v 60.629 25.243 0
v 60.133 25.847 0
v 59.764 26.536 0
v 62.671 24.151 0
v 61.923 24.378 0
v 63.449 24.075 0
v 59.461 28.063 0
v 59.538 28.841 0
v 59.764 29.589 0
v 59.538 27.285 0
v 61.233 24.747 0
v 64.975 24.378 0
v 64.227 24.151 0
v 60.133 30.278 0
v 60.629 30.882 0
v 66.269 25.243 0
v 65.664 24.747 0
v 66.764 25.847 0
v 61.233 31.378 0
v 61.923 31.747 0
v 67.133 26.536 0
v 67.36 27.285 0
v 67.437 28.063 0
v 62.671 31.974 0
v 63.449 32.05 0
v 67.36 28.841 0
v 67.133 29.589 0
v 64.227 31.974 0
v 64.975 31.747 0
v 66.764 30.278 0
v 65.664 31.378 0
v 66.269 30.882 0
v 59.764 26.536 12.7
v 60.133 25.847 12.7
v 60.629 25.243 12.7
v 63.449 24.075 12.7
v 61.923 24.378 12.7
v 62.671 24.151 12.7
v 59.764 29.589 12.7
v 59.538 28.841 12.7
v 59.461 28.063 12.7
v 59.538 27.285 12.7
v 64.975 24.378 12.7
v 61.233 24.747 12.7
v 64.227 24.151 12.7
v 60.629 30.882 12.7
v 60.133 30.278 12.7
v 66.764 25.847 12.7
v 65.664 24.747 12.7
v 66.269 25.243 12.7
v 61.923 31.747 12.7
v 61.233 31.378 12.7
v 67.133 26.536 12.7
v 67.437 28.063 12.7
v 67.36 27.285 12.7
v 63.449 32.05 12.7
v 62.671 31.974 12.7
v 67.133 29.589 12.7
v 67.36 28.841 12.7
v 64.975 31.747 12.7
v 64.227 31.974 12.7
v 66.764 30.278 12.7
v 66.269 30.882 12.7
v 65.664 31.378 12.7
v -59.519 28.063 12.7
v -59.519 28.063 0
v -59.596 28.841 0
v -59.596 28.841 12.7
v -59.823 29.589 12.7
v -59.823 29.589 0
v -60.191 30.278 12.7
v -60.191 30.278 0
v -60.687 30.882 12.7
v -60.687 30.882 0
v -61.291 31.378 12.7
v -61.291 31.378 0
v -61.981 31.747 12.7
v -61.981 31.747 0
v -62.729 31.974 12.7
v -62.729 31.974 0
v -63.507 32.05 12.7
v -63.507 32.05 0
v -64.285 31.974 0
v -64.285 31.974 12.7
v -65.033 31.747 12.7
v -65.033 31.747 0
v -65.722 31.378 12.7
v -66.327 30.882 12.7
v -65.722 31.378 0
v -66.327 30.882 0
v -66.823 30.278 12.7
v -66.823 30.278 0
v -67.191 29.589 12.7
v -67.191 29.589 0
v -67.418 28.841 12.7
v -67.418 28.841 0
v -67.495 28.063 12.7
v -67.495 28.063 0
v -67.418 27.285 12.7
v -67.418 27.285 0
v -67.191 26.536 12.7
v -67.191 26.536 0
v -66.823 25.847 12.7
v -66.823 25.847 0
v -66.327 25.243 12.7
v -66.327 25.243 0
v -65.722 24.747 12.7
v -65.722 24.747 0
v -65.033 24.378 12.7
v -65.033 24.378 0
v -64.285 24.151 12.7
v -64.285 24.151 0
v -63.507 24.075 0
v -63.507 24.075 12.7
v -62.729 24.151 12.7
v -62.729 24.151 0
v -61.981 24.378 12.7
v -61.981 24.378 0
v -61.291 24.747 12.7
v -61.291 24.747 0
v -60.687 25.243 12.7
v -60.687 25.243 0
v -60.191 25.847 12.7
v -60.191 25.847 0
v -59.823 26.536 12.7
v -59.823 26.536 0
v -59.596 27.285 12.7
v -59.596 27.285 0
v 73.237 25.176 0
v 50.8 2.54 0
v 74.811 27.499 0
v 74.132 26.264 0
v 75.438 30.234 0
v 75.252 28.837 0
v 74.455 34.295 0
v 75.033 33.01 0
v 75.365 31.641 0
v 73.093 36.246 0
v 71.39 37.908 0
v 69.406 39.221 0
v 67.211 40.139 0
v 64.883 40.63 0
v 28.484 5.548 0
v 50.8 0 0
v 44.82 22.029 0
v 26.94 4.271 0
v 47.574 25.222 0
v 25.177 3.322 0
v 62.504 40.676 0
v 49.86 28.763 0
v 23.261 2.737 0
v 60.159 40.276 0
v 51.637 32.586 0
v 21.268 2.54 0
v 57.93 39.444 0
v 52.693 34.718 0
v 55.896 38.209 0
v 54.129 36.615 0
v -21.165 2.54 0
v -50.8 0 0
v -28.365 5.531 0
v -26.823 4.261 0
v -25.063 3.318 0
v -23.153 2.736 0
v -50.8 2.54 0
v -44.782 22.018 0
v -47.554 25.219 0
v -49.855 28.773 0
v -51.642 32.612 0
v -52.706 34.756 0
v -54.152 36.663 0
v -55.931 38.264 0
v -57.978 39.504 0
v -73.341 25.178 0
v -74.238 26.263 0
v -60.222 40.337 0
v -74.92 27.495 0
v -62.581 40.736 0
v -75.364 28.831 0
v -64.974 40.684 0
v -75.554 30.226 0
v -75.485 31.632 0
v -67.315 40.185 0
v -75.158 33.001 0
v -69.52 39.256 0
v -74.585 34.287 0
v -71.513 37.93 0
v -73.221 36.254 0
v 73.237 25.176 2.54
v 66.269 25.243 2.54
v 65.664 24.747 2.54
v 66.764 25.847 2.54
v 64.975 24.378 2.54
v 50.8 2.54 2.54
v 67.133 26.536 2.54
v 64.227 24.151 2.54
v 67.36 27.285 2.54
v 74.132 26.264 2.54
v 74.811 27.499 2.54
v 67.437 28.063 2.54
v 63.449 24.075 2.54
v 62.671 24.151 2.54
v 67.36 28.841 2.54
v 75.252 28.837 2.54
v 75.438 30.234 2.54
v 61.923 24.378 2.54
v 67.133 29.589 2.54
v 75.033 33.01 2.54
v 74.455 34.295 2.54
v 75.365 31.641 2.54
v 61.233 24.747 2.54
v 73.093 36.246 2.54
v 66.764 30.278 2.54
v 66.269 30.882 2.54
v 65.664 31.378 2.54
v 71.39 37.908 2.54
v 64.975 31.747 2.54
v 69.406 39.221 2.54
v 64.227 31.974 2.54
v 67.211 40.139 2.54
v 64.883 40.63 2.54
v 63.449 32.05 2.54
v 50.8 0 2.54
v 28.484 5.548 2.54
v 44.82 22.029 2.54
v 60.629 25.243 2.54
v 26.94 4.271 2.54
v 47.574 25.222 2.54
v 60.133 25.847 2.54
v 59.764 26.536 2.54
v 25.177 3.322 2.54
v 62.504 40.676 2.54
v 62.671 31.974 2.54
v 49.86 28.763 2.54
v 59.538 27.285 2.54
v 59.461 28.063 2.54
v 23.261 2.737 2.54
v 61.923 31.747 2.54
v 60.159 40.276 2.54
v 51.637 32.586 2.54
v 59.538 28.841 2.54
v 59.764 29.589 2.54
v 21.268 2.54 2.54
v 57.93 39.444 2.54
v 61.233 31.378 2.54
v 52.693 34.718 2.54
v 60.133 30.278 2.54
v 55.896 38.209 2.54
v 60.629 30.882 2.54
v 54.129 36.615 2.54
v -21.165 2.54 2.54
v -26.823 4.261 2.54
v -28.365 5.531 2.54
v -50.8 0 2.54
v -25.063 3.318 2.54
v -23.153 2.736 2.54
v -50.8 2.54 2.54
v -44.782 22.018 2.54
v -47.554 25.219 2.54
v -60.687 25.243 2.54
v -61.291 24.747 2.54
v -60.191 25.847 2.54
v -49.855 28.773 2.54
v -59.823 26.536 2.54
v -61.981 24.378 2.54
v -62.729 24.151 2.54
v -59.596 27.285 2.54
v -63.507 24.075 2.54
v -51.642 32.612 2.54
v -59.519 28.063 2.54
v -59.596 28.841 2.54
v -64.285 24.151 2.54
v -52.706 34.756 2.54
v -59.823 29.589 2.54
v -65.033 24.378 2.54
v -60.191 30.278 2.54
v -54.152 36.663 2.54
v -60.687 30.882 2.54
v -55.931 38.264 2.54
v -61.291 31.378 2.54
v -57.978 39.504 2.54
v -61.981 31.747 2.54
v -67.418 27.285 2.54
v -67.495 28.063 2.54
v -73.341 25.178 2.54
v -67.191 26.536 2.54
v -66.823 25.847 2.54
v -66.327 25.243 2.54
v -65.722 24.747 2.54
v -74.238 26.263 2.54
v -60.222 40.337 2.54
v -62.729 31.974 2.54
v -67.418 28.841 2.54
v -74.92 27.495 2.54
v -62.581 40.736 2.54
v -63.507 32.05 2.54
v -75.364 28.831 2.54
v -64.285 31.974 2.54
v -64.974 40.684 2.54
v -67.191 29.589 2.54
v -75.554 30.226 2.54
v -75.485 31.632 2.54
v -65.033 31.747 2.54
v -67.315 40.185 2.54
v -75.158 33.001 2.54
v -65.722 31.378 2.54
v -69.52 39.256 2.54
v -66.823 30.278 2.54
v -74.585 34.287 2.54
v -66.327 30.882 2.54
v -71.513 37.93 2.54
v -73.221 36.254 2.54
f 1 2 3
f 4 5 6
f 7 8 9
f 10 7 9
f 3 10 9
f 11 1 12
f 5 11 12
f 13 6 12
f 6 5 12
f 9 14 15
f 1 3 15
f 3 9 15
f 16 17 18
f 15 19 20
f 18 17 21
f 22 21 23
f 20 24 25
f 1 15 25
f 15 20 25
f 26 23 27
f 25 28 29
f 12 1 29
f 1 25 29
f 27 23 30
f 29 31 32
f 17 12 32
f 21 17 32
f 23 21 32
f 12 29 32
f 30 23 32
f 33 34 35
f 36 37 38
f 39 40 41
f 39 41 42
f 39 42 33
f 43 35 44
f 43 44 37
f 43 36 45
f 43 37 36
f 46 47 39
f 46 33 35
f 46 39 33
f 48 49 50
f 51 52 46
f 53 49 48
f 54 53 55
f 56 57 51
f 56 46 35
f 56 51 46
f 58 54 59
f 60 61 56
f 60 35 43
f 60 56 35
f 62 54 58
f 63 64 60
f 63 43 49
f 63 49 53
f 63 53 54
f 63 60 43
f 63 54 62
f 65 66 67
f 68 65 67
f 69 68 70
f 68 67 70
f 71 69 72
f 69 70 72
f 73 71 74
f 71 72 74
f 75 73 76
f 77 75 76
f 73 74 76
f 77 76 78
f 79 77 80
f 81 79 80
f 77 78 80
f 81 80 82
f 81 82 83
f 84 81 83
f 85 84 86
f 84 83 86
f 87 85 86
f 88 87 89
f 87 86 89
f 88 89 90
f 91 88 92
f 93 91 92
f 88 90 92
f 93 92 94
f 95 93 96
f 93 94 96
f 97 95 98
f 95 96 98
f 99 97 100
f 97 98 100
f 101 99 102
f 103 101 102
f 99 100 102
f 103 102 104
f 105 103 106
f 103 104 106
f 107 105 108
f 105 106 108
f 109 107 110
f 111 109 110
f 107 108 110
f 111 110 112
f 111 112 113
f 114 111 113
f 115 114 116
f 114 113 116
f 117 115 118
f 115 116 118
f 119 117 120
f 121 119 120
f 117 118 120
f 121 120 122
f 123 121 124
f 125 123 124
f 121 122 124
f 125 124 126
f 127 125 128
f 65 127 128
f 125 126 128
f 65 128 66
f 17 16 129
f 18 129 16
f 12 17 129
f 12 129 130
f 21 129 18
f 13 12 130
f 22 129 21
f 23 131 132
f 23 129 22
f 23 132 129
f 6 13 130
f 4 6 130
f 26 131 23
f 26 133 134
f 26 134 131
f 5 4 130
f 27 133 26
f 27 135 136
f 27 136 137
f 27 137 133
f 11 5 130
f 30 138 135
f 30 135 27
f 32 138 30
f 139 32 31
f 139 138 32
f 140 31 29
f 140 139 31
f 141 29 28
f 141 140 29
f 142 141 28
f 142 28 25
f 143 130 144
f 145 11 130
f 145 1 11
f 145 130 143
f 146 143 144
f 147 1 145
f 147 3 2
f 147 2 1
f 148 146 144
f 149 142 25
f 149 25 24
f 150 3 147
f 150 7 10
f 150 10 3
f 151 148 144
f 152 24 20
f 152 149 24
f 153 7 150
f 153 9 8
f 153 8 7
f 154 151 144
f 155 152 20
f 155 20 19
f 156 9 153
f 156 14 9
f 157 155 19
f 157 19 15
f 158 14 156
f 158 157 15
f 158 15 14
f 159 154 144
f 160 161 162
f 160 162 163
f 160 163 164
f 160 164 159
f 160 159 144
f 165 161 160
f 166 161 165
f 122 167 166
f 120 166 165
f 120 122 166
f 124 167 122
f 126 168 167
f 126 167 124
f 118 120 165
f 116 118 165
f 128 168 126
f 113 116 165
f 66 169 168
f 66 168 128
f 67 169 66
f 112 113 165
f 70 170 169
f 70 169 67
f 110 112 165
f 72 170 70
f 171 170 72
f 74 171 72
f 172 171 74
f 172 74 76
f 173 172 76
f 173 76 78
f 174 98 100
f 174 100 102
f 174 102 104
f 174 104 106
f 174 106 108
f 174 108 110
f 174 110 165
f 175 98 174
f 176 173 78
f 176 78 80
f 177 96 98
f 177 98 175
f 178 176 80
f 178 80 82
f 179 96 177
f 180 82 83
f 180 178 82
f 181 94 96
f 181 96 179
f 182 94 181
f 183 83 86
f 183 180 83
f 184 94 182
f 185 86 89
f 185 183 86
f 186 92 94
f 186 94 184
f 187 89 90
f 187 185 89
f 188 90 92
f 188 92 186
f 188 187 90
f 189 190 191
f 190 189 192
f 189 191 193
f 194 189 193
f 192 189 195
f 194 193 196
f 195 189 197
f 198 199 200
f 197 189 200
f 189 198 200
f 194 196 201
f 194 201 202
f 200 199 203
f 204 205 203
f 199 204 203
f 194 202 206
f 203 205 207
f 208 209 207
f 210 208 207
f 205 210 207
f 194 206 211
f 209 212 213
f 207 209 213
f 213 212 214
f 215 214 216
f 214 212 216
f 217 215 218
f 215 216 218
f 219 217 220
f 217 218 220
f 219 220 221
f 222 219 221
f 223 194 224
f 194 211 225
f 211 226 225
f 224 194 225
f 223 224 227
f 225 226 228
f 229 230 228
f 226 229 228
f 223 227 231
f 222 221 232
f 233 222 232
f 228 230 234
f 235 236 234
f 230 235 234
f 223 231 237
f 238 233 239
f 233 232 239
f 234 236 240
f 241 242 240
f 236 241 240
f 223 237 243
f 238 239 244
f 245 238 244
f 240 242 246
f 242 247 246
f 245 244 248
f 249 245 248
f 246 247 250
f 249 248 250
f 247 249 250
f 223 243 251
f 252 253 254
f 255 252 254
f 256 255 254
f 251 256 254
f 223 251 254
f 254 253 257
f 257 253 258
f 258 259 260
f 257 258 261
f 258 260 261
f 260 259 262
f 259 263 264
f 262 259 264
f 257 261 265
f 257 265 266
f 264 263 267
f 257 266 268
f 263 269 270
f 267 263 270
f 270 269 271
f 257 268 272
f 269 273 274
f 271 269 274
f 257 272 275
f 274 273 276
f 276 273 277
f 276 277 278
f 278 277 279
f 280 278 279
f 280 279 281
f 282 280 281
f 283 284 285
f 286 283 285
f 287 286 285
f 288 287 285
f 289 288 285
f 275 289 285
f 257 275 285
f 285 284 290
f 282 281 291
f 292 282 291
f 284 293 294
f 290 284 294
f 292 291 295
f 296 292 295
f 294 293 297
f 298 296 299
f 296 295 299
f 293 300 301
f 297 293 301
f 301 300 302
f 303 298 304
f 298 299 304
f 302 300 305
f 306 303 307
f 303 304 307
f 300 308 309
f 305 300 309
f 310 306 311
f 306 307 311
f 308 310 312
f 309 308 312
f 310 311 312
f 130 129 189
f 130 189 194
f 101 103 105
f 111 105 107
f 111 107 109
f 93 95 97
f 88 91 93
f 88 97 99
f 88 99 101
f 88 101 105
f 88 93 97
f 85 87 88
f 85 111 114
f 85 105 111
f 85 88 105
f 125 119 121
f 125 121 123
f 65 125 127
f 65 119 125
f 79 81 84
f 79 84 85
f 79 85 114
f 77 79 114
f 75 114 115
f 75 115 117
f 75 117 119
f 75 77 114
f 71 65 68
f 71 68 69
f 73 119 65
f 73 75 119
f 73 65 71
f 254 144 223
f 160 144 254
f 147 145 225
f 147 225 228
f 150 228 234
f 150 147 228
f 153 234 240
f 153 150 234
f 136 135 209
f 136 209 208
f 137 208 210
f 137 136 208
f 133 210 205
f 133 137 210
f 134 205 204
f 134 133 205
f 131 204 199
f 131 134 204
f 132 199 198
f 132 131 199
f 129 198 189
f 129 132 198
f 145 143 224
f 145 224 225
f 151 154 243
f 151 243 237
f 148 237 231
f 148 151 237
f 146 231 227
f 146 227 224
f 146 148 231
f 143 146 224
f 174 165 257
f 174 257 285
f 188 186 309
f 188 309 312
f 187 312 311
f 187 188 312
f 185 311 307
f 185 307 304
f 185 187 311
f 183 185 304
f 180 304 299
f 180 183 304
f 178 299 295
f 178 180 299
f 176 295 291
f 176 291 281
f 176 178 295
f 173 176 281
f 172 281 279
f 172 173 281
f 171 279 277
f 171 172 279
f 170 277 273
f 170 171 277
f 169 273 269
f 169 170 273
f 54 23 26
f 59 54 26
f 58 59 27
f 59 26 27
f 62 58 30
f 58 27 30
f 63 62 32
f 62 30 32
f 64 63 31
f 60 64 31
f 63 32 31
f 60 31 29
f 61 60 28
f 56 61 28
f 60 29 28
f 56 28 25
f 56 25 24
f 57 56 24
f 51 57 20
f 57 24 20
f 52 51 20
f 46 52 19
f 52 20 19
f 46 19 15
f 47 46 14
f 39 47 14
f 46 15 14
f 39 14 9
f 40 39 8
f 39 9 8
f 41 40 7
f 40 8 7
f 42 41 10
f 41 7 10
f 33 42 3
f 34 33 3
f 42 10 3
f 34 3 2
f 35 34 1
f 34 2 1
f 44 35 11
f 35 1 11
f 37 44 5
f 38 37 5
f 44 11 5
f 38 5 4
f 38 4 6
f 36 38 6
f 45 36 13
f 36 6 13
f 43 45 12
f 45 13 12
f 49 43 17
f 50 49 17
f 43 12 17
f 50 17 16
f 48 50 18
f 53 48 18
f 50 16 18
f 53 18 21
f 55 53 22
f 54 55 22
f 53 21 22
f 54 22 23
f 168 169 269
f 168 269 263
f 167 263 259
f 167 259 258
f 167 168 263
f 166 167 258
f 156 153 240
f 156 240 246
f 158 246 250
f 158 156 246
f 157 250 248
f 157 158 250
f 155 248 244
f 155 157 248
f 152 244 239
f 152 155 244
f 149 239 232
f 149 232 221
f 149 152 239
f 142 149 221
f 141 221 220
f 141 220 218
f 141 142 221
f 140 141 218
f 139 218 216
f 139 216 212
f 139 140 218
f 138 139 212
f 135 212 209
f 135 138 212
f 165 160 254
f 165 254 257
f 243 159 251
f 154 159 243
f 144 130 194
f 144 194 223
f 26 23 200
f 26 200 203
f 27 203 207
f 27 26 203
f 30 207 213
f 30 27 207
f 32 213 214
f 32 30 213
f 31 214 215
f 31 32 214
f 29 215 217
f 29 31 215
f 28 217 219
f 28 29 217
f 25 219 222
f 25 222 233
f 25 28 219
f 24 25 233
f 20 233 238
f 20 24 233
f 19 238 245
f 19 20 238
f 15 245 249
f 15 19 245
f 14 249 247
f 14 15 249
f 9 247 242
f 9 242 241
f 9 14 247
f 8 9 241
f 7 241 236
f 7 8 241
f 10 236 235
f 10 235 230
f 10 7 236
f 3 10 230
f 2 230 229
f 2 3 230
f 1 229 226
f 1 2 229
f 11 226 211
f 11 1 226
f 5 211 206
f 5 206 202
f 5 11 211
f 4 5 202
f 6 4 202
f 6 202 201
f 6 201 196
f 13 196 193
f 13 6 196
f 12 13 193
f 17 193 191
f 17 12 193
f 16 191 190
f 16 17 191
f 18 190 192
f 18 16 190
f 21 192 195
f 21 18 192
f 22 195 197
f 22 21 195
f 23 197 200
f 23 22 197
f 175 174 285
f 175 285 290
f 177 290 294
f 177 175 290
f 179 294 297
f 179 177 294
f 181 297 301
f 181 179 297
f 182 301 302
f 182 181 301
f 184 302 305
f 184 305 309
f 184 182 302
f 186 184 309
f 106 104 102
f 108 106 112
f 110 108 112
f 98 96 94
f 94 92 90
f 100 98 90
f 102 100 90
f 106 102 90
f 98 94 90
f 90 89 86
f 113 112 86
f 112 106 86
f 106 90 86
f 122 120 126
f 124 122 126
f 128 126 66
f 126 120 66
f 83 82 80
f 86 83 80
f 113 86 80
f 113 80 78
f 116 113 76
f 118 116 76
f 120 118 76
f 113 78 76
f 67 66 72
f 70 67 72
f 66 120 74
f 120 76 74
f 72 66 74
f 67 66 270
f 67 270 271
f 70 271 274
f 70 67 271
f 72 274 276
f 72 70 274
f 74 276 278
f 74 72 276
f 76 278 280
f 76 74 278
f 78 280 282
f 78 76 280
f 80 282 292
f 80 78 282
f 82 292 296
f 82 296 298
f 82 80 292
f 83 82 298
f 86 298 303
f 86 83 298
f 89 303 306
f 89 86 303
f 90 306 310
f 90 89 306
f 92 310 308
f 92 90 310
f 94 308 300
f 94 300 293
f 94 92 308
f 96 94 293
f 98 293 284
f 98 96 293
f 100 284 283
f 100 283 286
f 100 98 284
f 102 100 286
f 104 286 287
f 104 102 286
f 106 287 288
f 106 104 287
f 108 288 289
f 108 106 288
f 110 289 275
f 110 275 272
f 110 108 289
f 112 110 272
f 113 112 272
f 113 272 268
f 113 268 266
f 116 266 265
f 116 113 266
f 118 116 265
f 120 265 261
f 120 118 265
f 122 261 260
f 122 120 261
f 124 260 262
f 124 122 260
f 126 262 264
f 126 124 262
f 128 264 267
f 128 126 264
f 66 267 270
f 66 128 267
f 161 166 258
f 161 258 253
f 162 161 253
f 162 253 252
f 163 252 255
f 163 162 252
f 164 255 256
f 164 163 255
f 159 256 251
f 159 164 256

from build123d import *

# Parameters (mm, degrees)
SKETCH1_R           = 3.9878
BOSS_EXTRUDE1_DEPTH = 2.54
SKETCH1_4_R         = 3.9878
BOSS_EXTRUDE2_DEPTH = 12.7
SKETCH1_5_R         = 3.9878
BOSS_EXTRUDE3_DEPTH = 12.7


with BuildPart() as part:
    # Sketch1 → Boss-Extrude1 (new body)
    with BuildSketch(Plane.XY):
        with BuildLine():
            Line((50.8, 0), (-50.8, 0))
            Line((-50.8, 0), (-50.8, 2.54))
            Line((-50.8, 2.54), (-73.341153043, 25.177744556))
            ThreePointArc((-73.341153043, 25.177744556), (-75.4914777, 29.523776435), (-74.584603309, 34.287122743))
            ThreePointArc((-74.584603309, 34.287122743), (-62.581465352, 40.735598954), (-51.642336586, 32.611952722))
            ThreePointArc((-51.642336586, 32.611952722), (-48.766264236, 26.956085459), (-44.781504954, 22.018239761))
            Line((-44.781504954, 22.018239761), (-28.364783953, 5.531171163))
            ThreePointArc((-28.364783953, 5.531171163), (-25.06333146, 3.317545604), (-21.165235834, 2.54))
            Line((-21.165235834, 2.54), (21.267773614, 2.54))
            ThreePointArc((21.267773614, 2.54), (25.176615334, 3.322017466), (28.483728216, 5.547685746))
            Line((28.483728216, 5.547685746), (44.820167783, 22.029484797))
            ThreePointArc((44.820167783, 22.029484797), (48.778264576, 26.952668705), (51.636518818, 32.586020523))
            ThreePointArc((51.636518818, 32.586020523), (62.503979201, 40.675909873), (74.455285467, 34.295135356))
            ThreePointArc((74.455285467, 34.295135356), (75.377410668, 29.530967861), (73.236533925, 25.176171243))
            Line((73.236533925, 25.176171243), (50.8, 2.54))
            Line((50.8, 2.54), (50.8, 0))
        make_face()
        with Locations((-63.506812189, 28.062524772)):
            Circle(SKETCH1_R, mode=Mode.SUBTRACT)
        with Locations((63.448715782, 28.062524772)):
            Circle(SKETCH1_R, mode=Mode.SUBTRACT)
    extrude(amount=BOSS_EXTRUDE1_DEPTH)


with BuildPart() as body_2:
    # Sketch1<4> → Boss-Extrude2 (new body)
    with BuildSketch(Plane.XY):
        with Locations((-63.506812189, 28.062524772)):
            Circle(SKETCH1_4_R)
    extrude(amount=BOSS_EXTRUDE2_DEPTH)


with BuildPart() as body_3:
    # Sketch1<5> → Boss-Extrude3 (new body)
    with BuildSketch(Plane.XY):
        with Locations((63.448715782, 28.062524772)):
            Circle(SKETCH1_5_R)
    extrude(amount=BOSS_EXTRUDE3_DEPTH)


solid = Compound([part.part, body_2.part, body_3.part])
